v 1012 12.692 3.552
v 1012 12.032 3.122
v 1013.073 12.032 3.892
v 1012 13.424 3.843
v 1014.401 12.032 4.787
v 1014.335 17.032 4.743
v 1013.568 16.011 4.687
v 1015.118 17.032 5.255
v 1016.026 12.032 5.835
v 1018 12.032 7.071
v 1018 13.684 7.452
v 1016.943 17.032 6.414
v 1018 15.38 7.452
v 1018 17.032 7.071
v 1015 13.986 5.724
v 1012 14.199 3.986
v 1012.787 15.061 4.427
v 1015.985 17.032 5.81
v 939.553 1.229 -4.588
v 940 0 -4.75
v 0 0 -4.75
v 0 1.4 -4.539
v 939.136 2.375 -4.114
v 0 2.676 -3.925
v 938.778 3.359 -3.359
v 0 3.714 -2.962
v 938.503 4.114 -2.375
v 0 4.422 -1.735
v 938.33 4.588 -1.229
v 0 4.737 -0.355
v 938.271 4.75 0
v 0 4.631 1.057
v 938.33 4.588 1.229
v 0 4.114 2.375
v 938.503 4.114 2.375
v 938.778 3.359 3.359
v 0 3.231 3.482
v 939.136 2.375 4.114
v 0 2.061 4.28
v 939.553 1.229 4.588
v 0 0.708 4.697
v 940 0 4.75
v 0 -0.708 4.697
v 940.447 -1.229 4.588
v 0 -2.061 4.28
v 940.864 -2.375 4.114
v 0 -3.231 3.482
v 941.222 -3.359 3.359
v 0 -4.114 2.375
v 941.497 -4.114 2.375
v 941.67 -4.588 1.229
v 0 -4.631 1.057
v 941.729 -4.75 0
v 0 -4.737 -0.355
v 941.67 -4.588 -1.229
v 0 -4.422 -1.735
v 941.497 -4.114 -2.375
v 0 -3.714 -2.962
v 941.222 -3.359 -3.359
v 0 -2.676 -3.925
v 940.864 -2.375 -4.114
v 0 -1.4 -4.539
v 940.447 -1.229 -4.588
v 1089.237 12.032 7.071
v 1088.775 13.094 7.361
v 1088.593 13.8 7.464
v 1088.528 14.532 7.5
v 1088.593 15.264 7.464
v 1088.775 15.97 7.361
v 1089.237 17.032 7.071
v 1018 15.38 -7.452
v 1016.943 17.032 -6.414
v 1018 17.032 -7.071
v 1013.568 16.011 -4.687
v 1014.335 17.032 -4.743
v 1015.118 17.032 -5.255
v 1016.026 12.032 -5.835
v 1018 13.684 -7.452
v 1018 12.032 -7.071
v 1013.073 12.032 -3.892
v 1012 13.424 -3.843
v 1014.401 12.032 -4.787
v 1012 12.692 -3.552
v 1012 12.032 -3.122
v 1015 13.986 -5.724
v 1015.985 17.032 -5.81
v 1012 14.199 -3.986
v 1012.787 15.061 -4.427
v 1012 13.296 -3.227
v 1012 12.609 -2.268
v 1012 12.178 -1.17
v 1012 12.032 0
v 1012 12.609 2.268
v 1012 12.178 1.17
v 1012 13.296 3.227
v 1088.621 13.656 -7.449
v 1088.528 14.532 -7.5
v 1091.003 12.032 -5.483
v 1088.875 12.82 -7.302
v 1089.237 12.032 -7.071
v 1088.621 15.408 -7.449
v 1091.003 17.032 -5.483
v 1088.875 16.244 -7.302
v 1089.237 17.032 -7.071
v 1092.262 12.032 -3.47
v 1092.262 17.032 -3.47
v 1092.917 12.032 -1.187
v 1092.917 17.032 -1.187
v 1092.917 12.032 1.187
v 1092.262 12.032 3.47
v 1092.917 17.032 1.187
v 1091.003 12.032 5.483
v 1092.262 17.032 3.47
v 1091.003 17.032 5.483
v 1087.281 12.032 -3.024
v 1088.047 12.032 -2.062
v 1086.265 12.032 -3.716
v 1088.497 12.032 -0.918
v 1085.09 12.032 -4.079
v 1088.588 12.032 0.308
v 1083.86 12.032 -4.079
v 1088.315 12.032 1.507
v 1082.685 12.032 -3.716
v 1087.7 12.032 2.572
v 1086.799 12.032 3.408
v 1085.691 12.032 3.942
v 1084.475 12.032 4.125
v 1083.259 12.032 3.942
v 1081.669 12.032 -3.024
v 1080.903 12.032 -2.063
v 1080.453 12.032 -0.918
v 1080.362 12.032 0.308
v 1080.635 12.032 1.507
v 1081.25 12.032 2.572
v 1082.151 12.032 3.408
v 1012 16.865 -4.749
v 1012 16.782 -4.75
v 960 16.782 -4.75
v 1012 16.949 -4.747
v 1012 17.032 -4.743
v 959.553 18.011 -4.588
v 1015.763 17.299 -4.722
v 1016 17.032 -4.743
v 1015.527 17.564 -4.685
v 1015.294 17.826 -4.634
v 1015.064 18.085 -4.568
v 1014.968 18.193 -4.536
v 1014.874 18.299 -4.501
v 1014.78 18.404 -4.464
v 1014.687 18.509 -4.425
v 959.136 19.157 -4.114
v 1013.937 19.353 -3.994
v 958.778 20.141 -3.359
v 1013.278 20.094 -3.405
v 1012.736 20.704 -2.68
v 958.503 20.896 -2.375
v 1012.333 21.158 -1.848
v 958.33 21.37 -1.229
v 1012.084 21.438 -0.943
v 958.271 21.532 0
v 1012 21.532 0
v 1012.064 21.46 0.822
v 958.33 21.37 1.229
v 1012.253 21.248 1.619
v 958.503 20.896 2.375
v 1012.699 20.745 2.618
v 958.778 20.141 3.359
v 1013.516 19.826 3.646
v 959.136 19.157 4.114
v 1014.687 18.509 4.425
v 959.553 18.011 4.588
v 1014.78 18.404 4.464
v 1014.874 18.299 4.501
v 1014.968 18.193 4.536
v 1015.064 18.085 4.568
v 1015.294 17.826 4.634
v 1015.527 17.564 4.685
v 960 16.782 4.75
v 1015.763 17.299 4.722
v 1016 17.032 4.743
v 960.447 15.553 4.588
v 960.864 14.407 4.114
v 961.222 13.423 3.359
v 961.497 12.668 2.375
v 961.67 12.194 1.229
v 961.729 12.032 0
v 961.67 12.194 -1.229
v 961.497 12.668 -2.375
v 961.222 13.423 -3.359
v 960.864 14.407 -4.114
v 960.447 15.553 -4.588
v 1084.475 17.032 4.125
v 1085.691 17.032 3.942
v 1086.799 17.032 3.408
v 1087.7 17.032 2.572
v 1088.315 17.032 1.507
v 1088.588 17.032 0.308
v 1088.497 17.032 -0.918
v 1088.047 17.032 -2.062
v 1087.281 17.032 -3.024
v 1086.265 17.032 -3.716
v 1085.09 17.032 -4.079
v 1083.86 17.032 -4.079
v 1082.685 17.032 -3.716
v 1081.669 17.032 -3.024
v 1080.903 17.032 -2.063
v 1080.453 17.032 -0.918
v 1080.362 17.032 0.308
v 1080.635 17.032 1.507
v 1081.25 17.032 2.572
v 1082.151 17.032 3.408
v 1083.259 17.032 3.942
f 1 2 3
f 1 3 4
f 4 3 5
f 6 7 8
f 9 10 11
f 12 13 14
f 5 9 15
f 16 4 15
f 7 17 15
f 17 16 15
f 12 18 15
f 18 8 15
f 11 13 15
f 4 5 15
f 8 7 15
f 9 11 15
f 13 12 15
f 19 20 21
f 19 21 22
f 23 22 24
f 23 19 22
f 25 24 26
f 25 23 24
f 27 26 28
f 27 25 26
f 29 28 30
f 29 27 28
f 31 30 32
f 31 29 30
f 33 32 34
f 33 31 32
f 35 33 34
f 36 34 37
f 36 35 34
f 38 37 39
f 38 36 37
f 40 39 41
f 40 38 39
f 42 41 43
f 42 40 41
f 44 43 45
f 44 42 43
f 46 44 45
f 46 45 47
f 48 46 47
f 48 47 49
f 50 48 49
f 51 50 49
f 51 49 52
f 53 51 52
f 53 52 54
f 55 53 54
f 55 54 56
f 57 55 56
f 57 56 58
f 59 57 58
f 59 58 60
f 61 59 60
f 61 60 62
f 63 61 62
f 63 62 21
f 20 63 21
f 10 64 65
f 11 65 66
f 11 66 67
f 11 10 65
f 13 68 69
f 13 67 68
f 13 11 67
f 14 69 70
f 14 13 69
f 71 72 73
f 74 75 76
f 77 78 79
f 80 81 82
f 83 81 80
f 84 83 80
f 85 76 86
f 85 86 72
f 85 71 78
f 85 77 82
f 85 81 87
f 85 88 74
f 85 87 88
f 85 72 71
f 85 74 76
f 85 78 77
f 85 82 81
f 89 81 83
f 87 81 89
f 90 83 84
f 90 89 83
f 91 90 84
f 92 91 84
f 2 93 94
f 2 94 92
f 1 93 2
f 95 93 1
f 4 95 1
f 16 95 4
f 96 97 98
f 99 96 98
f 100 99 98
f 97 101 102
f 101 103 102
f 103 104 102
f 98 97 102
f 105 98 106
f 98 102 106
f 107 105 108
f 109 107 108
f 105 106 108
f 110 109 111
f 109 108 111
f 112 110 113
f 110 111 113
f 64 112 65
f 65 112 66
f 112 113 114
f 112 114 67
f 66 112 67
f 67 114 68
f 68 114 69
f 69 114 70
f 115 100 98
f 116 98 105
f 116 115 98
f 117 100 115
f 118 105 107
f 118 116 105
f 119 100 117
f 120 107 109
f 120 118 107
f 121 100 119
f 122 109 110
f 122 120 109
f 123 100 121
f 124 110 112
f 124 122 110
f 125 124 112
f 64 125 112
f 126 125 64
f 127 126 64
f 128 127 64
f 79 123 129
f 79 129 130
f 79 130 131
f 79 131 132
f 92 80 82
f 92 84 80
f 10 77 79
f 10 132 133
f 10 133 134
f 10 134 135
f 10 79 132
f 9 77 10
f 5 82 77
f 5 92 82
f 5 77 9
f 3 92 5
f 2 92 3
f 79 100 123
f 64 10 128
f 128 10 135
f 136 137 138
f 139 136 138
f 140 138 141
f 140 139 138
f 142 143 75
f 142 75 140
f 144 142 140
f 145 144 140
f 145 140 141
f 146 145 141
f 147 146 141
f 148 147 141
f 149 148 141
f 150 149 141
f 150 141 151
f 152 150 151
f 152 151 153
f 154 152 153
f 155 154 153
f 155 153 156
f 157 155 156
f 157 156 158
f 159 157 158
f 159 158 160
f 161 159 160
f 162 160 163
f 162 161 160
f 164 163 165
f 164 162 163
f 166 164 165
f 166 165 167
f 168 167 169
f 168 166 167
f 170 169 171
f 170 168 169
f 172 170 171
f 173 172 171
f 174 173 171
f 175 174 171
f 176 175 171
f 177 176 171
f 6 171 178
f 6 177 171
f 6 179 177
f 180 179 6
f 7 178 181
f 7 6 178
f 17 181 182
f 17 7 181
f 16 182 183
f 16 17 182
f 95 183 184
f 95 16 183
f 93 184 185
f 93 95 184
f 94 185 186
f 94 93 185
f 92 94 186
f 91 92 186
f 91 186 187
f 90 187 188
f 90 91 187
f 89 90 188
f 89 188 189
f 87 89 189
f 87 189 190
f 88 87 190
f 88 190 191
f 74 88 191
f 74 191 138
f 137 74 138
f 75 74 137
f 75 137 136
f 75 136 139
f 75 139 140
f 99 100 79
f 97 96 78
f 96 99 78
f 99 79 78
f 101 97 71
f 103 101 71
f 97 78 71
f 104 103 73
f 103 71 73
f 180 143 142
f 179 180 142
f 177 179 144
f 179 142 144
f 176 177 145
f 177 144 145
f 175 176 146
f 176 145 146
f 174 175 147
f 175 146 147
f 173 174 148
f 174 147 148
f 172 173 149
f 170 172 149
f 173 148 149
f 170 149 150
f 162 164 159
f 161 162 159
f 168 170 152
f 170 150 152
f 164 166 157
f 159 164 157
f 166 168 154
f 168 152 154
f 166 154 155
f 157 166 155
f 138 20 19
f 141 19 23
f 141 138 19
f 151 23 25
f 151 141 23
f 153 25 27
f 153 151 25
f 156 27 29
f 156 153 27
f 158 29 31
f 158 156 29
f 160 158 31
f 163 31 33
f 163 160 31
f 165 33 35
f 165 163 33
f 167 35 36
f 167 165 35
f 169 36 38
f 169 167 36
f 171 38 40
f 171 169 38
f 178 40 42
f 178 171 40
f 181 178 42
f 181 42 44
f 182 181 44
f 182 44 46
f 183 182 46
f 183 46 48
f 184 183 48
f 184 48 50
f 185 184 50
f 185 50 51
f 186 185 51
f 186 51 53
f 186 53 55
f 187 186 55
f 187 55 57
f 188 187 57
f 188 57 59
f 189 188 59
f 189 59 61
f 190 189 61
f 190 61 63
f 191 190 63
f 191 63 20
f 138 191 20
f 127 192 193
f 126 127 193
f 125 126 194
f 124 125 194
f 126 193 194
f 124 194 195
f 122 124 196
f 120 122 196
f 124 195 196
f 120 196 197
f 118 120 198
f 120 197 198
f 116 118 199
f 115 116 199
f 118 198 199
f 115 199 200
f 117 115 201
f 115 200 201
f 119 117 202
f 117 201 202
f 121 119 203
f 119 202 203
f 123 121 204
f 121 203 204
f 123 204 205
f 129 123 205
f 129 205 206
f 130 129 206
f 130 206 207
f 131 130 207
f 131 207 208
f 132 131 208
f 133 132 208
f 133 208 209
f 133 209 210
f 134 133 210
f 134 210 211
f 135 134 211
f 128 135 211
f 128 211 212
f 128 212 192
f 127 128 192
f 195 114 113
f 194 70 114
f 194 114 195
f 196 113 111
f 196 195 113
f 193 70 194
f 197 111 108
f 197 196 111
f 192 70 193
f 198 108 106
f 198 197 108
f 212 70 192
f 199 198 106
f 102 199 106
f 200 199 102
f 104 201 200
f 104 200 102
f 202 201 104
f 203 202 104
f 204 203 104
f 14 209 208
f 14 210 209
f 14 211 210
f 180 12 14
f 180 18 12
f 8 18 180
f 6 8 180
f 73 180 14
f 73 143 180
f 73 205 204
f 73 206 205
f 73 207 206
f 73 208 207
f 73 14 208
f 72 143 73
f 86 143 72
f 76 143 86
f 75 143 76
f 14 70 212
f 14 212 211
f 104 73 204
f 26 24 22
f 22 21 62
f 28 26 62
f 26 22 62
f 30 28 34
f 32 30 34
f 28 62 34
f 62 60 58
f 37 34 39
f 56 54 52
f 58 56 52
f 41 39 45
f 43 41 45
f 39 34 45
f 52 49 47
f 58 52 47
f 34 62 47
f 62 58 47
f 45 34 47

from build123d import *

# Parameters (mm, degrees)
SKETCH2_R               = 4.75
BOSS_EXTRUDE1_DEPTH     = 77
SKETCH4_R               = 4.125
CUT_EXTRUDE1_DEPTH      = 77
CUT_EXTRUDE2_DEPTH      = 77
CUT_EXTRUDE3_DEPTH      = 77
CUT_EXTRUDE3_DEPTH_BACK = 77
BOSS_EXTRUDE2_START     = 4
BOSS_EXTRUDE2_DEPTH     = 4
CHAMFER1_SIZE           = 6
CHAMFER1_SIZE_2         = 3.5


with BuildPart() as part:
    # Sweep1: sweep along a path in Sketch1
    with BuildLine(Plane.XY) as sweep1_path:
        Line((0, 0), (940, 0))
        Line((940, 0), (960, 16.781992624))
        Line((960, 16.781992624), (1016, 16.781992624))
    # Sketch2 → Sweep1 (sweep)
    with BuildSketch(Plane(origin=(0, 0, 0), x_dir=(0, 0, -1), z_dir=(1, 0, 0))):
        Circle(SKETCH2_R)
    sweep(path=sweep1_path.line, transition=Transition.RIGHT)

    # Sketch3 → Boss-Extrude1 (add)
    with BuildSketch(Plane(origin=(1016, 0, 0), x_dir=(0, 0, -1), z_dir=(1, 0, 0))):
        with BuildLine():
            Line((-7.071067812, 12.031992624), (7.071067812, 12.031992624))
            ThreePointArc((7.071067812, 12.031992624), (7.5, 14.531992624), (7.071067812, 17.031992624))
            Line((7.071067812, 17.031992624), (-7.071067812, 17.031992624))
            ThreePointArc((-7.071067812, 17.031992624), (-7.5, 14.531992624), (-7.071067812, 12.031992624))
        make_face()
    extrude(amount=BOSS_EXTRUDE1_DEPTH)

    # Sketch4 → Cut-Extrude1 (cut)
    with BuildSketch(Plane(origin=(0, 17.031992624, 0), x_dir=(1, 0, 0), z_dir=(0, 1, 0))):
        with Locations(Location((1084.475, 0, 0), (0, 0, 270))):
            Circle(SKETCH4_R)
    extrude(amount=-CUT_EXTRUDE1_DEPTH, mode=Mode.SUBTRACT)

    # Sketch5 → Cut-Extrude2 (cut)
    with BuildSketch(Plane(origin=(0, 17.031992624, 0), x_dir=(1, 0, 0), z_dir=(0, 1, 0))):
        with BuildLine():
            Line((1093, 7.5), (1088.527853933, 7.5))
            ThreePointArc((1088.527853933, 7.5), (1093, 0), (1088.527853933, -7.5))
            Line((1088.527853933, -7.5), (1093, -7.5))
            Line((1093, -7.5), (1095.488265068, 1.431081092))
            Line((1095.488265068, 1.431081092), (1093, 7.5))
        make_face()
    extrude(amount=-CUT_EXTRUDE2_DEPTH, mode=Mode.SUBTRACT)

    # Sketch6 → Cut-Extrude3 (cut, two sides: drawn at the far end of the back side and taken through both)
    with BuildSketch(Plane.XY.offset(-CUT_EXTRUDE3_DEPTH_BACK)):
        Polygon((1016, 17.031992624), (1012, 21.531992624), (1018.885341188, 26.165219669), (1022.40477818, 20.935058436), align=None)
    extrude(amount=CUT_EXTRUDE3_DEPTH + CUT_EXTRUDE3_DEPTH_BACK, mode=Mode.SUBTRACT)

    # Sketch7 → Boss-Extrude2 (add)
    with BuildSketch(Plane.ZY.offset(-1016).offset(BOSS_EXTRUDE2_START)):
        with BuildLine():
            Line((7.071067812, 17.031992624), (4.74341649, 17.031992624))
            Line((4.74341649, 17.031992624), (-4.74341649, 17.031992624))
            Line((-4.74341649, 17.031992624), (-7.071067812, 17.031992624))
            ThreePointArc((-7.071067812, 17.031992624), (-7.5, 14.531992624), (-7.071067812, 12.031992624))
            Line((-7.071067812, 12.031992624), (0, 12.031992624))
            Line((0, 12.031992624), (7.071067812, 12.031992624))
            ThreePointArc((7.071067812, 12.031992624), (7.5, 14.531992624), (7.071067812, 17.031992624))
        make_face()
    extrude(amount=-BOSS_EXTRUDE2_DEPTH)

    # Chamfer1
    # the kernel refuses this chamfer: 6, 3.5 mm, written as the material it takes off along each edge
    with BuildSketch(Plane(origin=(1012, 14.531992624, 0), x_dir=(0, 0.6684369034983231, 0.7437688525621206), z_dir=(0, -0.7437688525621206, 0.6684369034983231))) as chamfer1_piece_1_section:
        Polygon((7.5, -CHAMFER1_SIZE), (7.5 - CHAMFER1_SIZE_2, 0), (7.5, 0), align=None)
    chamfer1_piece_1 = revolve(axis=Axis((1012, 14.531992624, 0), (-1, 0, 0)), revolution_arc=276.106922799, mode=Mode.PRIVATE)
    chamfer1_piece_1 = chamfer1_piece_1 - Plane(origin=(1014.966337757, 16.781992624, 0), x_dir=(0, 0, -1), z_dir=(1, 0, 0)) * Cylinder(4.75, 30, mode=Mode.PRIVATE)
    add(chamfer1_piece_1, mode=Mode.SUBTRACT)
    with BuildSketch(Plane(origin=(1012, 14.531992624, 0), x_dir=(0, -0.668436903498336, -0.743768852562109), z_dir=(0, 0.743768852562109, -0.668436903498336))) as chamfer1_piece_2_section:
        Polygon((7.5 - CHAMFER1_SIZE_2, 0), (7.5, -CHAMFER1_SIZE), (7.5, 0), align=None)
    chamfer1_piece_2 = revolve(axis=Axis((1012, 14.531992624, 0), (-1, 0, 0)), revolution_arc=276.106922799, mode=Mode.PRIVATE)
    chamfer1_piece_2 = chamfer1_piece_2 - Plane(origin=(1014.966337768, 16.781992624, 0), x_dir=(0, 0, -1), z_dir=(1, 0, 0)) * Cylinder(4.75, 31, mode=Mode.PRIVATE)
    add(chamfer1_piece_2, mode=Mode.SUBTRACT)


solid = part.part
